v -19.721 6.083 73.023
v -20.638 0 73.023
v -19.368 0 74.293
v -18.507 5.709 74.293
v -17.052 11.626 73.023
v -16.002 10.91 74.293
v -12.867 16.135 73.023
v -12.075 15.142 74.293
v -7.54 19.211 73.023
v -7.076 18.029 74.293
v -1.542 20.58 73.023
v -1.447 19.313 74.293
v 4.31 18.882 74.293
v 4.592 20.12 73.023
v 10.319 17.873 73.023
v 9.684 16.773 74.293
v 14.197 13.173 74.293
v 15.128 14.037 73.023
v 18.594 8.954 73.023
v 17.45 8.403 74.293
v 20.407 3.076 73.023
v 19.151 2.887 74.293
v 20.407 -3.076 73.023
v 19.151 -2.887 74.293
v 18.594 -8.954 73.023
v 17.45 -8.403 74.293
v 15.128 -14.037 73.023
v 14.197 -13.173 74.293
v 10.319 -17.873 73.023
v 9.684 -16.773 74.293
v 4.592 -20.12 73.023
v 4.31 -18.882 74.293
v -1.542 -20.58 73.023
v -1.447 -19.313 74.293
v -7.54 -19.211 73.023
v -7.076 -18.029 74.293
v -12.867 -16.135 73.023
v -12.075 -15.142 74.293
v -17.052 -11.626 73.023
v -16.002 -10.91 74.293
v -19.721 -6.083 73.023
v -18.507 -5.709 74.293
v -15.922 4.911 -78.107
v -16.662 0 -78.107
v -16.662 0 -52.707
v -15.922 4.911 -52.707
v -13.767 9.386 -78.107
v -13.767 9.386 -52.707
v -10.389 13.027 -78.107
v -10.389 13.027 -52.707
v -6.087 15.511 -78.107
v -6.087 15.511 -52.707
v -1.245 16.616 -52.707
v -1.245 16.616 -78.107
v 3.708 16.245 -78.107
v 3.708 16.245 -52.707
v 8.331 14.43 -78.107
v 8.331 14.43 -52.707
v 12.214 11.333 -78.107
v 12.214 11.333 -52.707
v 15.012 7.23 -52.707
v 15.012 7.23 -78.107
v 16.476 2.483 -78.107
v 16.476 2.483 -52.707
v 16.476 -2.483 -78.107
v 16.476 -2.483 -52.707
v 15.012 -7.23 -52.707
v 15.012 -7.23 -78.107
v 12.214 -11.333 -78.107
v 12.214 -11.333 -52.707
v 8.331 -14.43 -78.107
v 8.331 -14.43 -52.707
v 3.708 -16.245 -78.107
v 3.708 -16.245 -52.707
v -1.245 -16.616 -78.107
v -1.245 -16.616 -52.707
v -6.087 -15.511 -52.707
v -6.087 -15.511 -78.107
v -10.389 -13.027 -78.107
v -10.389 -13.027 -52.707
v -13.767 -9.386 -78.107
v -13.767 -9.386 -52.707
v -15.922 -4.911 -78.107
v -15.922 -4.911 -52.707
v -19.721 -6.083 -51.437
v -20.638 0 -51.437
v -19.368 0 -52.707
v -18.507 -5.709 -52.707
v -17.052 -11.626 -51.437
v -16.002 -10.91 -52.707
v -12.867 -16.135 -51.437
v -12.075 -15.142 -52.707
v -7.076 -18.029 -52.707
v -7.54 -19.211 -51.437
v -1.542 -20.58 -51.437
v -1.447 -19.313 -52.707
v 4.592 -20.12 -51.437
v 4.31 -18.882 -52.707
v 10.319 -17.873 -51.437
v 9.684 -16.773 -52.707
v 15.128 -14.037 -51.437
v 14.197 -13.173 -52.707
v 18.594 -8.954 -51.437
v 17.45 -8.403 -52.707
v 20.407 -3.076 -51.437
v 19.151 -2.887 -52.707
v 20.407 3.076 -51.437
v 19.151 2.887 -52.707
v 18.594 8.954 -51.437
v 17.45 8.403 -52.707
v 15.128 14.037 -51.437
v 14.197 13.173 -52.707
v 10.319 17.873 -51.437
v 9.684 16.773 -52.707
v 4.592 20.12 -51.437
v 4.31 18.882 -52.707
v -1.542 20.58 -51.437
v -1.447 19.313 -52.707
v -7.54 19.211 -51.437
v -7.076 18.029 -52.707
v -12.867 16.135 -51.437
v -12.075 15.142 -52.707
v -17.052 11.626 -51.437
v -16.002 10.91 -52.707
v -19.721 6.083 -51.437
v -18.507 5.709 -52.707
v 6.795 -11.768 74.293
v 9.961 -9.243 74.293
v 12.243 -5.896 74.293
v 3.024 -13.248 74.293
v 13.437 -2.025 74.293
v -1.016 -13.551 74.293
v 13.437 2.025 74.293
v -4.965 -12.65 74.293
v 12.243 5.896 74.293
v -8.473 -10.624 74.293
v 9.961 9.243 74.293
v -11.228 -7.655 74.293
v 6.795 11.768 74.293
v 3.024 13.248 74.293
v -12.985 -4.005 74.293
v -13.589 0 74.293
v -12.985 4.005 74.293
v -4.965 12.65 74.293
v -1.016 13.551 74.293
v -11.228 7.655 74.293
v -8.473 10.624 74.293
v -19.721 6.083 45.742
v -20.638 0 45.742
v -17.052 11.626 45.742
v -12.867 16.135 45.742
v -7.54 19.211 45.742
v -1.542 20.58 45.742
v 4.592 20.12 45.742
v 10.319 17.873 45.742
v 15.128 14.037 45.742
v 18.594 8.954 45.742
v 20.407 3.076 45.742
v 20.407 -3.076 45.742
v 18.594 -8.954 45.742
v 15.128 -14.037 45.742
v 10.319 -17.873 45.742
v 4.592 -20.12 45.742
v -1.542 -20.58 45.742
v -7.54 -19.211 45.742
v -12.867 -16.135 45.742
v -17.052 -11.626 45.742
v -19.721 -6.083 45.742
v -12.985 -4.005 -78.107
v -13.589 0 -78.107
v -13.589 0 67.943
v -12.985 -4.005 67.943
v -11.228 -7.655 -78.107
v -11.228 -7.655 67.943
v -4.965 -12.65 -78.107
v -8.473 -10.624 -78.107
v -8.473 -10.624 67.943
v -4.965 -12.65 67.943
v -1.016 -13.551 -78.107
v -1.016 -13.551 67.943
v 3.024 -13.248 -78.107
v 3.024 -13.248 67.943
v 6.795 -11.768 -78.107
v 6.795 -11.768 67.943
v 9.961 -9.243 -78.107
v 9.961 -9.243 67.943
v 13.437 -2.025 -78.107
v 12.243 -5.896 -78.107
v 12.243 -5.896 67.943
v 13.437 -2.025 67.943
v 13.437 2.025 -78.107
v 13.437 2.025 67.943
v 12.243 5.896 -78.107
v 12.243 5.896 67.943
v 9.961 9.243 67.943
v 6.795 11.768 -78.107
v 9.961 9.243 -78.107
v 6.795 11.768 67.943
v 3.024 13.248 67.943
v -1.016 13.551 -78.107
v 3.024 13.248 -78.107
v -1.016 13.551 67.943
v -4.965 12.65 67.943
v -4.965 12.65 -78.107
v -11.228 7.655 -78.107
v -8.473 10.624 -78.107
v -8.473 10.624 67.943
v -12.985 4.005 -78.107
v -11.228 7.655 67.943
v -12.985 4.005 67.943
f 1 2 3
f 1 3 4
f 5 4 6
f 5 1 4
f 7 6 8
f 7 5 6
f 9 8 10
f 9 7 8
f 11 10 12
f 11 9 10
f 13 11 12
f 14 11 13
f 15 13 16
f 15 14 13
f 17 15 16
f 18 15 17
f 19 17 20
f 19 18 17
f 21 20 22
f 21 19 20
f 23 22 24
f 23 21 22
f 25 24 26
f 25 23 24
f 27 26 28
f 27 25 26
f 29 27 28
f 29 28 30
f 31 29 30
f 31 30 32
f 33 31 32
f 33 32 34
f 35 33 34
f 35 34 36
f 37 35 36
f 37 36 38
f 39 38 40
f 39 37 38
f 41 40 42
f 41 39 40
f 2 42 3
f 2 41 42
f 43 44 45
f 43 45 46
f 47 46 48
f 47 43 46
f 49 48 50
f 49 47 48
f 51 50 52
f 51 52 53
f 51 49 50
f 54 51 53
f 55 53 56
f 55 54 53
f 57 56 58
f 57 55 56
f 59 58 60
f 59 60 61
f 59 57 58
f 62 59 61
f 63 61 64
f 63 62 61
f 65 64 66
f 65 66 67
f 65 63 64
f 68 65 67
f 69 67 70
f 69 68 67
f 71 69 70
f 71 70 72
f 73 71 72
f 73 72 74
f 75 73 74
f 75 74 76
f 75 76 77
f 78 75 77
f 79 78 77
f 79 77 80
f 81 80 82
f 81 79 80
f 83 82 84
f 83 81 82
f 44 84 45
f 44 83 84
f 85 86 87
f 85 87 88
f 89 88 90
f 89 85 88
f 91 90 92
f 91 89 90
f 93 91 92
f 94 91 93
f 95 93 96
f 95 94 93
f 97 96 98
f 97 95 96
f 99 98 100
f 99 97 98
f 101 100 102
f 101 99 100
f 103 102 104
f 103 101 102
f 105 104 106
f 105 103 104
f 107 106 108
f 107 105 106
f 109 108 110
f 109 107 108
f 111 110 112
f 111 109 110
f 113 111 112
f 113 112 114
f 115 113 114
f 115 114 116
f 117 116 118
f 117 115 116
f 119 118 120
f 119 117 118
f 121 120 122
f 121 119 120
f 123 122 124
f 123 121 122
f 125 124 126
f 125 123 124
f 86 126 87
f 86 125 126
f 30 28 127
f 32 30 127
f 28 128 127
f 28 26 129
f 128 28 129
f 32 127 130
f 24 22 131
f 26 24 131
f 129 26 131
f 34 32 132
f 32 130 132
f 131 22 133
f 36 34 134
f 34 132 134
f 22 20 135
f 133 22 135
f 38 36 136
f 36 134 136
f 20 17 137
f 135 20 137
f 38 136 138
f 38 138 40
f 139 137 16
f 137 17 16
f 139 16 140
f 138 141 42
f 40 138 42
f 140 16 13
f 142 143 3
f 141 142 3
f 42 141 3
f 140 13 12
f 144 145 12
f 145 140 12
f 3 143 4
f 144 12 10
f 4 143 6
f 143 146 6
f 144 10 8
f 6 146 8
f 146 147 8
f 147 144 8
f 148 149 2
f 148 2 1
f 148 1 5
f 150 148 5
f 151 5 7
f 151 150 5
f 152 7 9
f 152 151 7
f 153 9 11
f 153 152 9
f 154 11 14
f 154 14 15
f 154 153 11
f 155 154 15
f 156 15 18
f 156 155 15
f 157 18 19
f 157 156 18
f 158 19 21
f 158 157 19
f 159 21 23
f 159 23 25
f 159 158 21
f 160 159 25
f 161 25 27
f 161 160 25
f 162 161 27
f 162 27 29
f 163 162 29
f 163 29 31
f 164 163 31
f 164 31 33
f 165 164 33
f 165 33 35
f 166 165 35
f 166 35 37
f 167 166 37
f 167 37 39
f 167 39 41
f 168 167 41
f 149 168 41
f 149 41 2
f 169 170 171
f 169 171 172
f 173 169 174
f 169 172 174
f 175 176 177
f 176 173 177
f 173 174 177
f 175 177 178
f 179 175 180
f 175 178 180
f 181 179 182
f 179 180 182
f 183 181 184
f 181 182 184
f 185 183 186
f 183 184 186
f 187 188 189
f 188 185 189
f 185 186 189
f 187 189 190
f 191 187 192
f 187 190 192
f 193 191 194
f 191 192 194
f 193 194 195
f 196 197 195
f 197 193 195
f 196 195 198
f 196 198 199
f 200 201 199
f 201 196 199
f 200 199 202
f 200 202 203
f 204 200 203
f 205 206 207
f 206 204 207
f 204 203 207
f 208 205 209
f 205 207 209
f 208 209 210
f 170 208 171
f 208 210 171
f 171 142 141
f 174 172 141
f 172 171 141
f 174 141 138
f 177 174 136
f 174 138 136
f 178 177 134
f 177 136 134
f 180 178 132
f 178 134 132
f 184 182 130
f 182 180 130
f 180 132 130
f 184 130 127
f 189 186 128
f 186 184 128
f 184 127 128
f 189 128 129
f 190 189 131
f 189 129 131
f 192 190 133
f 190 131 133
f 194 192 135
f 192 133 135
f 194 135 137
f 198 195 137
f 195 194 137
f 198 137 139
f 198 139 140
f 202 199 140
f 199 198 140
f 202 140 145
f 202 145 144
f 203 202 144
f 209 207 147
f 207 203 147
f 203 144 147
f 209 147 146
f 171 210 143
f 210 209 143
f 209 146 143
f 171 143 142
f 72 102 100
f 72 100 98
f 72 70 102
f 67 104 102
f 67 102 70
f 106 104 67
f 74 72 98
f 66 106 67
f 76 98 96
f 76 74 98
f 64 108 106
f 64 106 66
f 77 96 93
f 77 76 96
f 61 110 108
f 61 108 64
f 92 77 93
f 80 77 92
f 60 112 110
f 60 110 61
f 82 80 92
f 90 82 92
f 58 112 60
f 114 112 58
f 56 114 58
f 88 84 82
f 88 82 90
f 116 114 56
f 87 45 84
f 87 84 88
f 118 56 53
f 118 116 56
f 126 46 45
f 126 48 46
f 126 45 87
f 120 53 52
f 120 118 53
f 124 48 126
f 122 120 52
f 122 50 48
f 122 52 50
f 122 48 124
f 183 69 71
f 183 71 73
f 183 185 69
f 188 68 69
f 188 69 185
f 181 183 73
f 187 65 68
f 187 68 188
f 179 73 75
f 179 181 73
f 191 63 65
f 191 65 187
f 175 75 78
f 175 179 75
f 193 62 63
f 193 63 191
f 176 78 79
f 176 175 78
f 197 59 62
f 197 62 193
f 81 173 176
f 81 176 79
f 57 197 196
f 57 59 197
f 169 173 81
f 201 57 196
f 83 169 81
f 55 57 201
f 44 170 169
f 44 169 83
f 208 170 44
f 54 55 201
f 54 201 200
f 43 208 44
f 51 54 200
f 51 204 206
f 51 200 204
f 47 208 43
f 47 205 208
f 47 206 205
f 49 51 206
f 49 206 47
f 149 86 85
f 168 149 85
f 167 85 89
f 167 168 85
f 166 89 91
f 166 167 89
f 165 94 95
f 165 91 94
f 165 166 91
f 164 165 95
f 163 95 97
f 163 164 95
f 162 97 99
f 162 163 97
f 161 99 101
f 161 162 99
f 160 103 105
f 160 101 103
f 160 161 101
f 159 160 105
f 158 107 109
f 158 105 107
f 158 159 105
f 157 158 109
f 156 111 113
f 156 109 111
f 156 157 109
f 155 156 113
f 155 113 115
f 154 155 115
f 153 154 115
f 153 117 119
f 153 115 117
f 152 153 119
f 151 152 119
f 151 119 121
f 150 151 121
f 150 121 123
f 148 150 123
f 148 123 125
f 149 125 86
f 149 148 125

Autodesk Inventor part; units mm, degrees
ref_plane "YZ Plane" through (0, 0, 0) normal (1, 0, 0) x (0, 1, 0)
ref_plane "XZ Plane" through (0, 0, 0) normal (0, 1, 0) x (-1, 0, 0)
ref_plane "XY Plane" through (0, 0, 0) normal (0, 0, 1) x (1, 0, 0)
sketch "Sketch1" plane through (0, 0, 0) normal (0, 1, 0) x (-1, 0, 0)
  line L0 (0, 74.2932) -> (20.6375, 74.2932)
  line L1 (20.6375, 74.2932) -> (20.6375, 45.7421)
  line L2 (13.589, 67.9432) -> (0, 67.9432)
  line L3 (16.6624, -52.7068) -> (20.6375, -52.7068)
  line L4 (20.6375, -52.7068) -> (20.6375, 45.7421)
  line L5 (16.6624, -52.7068) -> (16.6624, -78.1068)
  line L6 (16.6624, -78.1068) -> (13.589, -78.1068)
  line L7 (13.589, -78.1068) -> (13.589, 67.9432)
  line L8 (0, 68.4776) -> (0, -51.9613) construction
  line L9 (13.589, 67.9432) -> (13.589, 74.2932)
  point P0 (0, 0)
  dimension "d0" = 20.6375
  dimension "d1" = 127
  dimension "d2" = 6.35
  dimension "d3" = 16.6624
  dimension "d4" = 13.589
  dimension "d12" = 25.4
  dimension "d19" = 3.0734
revolve "Revolution1" add sketch "Sketch1" angle 360 about axis through (0, 0, 68.4776) along (0, 0, -1)
thread "Thread1" size "1 5/16-18 UNEF" class "2A" standard "ANSI Unified Screw Threads" length 19.05
chamfer "Chamfer2" distance 1.27 angle 45 1 edges at (20.6375, 0, -52.7068)
chamfer "Chamfer3" distance 1.27 angle 45 1 edges at (20.6375, 0, 74.2932)
properties part number "EndHilt" material "Aluminum 6061"
